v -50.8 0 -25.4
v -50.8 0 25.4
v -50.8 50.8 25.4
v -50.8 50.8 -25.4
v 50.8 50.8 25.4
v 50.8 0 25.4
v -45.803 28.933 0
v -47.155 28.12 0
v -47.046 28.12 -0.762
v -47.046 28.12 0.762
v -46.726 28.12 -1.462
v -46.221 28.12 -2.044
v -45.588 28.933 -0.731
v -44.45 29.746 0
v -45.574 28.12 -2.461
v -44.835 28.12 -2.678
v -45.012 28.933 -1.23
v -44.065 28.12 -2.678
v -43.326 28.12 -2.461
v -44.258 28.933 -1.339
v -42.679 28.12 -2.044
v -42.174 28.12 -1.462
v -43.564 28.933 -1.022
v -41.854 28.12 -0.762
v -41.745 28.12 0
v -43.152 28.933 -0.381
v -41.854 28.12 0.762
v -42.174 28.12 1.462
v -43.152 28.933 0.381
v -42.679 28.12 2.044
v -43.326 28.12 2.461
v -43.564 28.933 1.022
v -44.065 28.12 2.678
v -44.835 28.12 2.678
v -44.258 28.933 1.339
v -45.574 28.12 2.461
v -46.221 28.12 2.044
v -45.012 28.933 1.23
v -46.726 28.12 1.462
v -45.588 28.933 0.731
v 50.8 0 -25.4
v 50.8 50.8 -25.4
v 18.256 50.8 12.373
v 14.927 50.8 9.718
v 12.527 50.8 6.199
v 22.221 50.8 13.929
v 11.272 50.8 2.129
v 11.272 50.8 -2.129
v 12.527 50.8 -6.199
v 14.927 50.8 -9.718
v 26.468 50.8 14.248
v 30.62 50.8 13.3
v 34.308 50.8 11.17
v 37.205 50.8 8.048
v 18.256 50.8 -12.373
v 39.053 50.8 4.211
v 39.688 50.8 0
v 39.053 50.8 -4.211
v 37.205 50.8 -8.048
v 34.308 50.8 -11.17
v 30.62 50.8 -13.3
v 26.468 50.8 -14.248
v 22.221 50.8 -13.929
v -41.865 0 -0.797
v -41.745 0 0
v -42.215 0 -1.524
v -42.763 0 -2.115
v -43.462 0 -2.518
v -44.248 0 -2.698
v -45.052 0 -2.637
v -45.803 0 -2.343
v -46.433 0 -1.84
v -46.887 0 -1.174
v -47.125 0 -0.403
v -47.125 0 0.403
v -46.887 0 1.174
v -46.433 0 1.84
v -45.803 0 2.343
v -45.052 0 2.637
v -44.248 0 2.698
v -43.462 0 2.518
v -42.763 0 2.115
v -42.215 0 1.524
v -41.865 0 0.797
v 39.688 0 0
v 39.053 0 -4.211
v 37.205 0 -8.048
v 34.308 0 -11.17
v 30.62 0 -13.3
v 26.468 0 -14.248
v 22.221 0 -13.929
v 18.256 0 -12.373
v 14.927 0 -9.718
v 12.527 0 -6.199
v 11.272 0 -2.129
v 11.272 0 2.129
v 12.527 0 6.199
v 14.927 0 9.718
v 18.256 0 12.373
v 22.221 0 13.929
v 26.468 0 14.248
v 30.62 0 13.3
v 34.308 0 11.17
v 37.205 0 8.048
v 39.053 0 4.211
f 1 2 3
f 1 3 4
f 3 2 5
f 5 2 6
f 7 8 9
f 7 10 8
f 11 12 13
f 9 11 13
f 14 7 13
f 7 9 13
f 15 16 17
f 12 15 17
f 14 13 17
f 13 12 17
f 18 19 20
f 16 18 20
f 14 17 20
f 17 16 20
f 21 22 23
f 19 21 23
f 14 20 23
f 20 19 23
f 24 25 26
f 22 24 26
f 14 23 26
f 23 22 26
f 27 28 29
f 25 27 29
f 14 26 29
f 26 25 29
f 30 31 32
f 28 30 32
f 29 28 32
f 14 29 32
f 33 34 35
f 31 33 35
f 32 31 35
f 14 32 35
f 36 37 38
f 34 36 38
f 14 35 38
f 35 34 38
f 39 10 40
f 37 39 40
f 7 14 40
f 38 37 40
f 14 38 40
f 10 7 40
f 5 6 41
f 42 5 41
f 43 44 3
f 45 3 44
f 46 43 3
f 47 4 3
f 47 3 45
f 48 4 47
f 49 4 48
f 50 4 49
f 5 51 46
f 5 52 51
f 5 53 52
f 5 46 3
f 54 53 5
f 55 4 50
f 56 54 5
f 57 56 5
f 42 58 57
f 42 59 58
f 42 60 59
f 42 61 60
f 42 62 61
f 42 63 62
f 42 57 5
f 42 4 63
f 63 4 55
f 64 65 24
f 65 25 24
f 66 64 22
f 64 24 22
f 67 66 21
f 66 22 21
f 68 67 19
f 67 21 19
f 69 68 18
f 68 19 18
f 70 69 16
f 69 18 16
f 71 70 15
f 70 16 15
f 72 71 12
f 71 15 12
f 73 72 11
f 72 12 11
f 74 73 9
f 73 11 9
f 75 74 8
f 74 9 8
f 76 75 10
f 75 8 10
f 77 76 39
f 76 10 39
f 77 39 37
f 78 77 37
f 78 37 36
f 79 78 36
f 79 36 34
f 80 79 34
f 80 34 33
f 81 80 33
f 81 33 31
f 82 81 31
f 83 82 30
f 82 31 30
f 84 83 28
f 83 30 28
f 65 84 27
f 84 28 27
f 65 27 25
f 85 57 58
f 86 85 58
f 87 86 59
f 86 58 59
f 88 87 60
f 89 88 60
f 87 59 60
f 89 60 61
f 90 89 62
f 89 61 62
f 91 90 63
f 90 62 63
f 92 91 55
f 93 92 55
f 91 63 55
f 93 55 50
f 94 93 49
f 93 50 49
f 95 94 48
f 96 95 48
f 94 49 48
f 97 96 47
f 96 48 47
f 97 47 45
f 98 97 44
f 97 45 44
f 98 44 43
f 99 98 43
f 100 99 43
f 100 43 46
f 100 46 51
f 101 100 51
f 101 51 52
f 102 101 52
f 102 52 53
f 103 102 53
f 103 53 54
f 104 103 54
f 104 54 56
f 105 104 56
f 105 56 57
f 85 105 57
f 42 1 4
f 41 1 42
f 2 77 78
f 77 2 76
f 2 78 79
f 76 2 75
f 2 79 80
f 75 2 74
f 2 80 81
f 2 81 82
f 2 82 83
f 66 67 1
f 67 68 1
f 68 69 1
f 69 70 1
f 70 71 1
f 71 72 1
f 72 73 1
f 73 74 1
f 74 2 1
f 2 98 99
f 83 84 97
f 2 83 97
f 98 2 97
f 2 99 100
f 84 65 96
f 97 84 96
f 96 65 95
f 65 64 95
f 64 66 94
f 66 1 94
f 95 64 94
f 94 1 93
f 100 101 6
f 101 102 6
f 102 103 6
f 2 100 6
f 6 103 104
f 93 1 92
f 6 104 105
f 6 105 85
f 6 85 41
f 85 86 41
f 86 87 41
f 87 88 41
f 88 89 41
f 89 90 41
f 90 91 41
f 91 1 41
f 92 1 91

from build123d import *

# Parameters (mm, degrees)
SKETCH1_W                   = 101.6
SKETCH1_H                   = 50.8
BOSS_EXTRUDE1_DEPTH         = 50.8
CUT_EXTRUDE1_REACH          = 52.8
SKETCH2_R                   = 14.2875
F_1_4_28_TAPPED_HOLE1_D     = 5.4102
F_1_4_28_TAPPED_HOLE1_DEPTH = 28.12034
F_1_4_28_TAPPED_HOLE1_TIP   = 1.625388061


with BuildPart() as part:
    # Sketch1 → Boss-Extrude1 (new body)
    with BuildSketch(Plane(origin=(0, 0, 0), x_dir=(1, 0, 0), z_dir=(0, 1, 0))):
        Rectangle(SKETCH1_W, SKETCH1_H)
    extrude(amount=BOSS_EXTRUDE1_DEPTH)

    # Sketch2 → Cut-Extrude1 (cut, up to next)
    with BuildSketch(Plane(origin=(0, 50.8, 0), x_dir=(1, 0, 0), z_dir=(0, 1, 0)), mode=Mode.PRIVATE) as cut_extrude1_sk1:
        with Locations((25.4, 0)):
            Circle(SKETCH2_R)
    cut_extrude1_tool1 = extrude(cut_extrude1_sk1.sketch, amount=-CUT_EXTRUDE1_REACH, mode=Mode.PRIVATE) & part.part
    add(cut_extrude1_tool1.solids().sort_by_distance((25.4, 50.8, 0))[0], mode=Mode.SUBTRACT)

    # 1/4-28 Tapped Hole1
    with Locations(Plane(origin=(0, 0, 0), x_dir=(-1, 0, 0), z_dir=(0, -1, 0))):
        with Locations((44.45, 0)):
            Hole(F_1_4_28_TAPPED_HOLE1_D / 2, depth=F_1_4_28_TAPPED_HOLE1_DEPTH)
            with Locations((0, 0, -(F_1_4_28_TAPPED_HOLE1_DEPTH + F_1_4_28_TAPPED_HOLE1_TIP / 2))):  # 118° drill point
                Cone(0, F_1_4_28_TAPPED_HOLE1_D / 2, F_1_4_28_TAPPED_HOLE1_TIP, mode=Mode.SUBTRACT)


solid = part.part
